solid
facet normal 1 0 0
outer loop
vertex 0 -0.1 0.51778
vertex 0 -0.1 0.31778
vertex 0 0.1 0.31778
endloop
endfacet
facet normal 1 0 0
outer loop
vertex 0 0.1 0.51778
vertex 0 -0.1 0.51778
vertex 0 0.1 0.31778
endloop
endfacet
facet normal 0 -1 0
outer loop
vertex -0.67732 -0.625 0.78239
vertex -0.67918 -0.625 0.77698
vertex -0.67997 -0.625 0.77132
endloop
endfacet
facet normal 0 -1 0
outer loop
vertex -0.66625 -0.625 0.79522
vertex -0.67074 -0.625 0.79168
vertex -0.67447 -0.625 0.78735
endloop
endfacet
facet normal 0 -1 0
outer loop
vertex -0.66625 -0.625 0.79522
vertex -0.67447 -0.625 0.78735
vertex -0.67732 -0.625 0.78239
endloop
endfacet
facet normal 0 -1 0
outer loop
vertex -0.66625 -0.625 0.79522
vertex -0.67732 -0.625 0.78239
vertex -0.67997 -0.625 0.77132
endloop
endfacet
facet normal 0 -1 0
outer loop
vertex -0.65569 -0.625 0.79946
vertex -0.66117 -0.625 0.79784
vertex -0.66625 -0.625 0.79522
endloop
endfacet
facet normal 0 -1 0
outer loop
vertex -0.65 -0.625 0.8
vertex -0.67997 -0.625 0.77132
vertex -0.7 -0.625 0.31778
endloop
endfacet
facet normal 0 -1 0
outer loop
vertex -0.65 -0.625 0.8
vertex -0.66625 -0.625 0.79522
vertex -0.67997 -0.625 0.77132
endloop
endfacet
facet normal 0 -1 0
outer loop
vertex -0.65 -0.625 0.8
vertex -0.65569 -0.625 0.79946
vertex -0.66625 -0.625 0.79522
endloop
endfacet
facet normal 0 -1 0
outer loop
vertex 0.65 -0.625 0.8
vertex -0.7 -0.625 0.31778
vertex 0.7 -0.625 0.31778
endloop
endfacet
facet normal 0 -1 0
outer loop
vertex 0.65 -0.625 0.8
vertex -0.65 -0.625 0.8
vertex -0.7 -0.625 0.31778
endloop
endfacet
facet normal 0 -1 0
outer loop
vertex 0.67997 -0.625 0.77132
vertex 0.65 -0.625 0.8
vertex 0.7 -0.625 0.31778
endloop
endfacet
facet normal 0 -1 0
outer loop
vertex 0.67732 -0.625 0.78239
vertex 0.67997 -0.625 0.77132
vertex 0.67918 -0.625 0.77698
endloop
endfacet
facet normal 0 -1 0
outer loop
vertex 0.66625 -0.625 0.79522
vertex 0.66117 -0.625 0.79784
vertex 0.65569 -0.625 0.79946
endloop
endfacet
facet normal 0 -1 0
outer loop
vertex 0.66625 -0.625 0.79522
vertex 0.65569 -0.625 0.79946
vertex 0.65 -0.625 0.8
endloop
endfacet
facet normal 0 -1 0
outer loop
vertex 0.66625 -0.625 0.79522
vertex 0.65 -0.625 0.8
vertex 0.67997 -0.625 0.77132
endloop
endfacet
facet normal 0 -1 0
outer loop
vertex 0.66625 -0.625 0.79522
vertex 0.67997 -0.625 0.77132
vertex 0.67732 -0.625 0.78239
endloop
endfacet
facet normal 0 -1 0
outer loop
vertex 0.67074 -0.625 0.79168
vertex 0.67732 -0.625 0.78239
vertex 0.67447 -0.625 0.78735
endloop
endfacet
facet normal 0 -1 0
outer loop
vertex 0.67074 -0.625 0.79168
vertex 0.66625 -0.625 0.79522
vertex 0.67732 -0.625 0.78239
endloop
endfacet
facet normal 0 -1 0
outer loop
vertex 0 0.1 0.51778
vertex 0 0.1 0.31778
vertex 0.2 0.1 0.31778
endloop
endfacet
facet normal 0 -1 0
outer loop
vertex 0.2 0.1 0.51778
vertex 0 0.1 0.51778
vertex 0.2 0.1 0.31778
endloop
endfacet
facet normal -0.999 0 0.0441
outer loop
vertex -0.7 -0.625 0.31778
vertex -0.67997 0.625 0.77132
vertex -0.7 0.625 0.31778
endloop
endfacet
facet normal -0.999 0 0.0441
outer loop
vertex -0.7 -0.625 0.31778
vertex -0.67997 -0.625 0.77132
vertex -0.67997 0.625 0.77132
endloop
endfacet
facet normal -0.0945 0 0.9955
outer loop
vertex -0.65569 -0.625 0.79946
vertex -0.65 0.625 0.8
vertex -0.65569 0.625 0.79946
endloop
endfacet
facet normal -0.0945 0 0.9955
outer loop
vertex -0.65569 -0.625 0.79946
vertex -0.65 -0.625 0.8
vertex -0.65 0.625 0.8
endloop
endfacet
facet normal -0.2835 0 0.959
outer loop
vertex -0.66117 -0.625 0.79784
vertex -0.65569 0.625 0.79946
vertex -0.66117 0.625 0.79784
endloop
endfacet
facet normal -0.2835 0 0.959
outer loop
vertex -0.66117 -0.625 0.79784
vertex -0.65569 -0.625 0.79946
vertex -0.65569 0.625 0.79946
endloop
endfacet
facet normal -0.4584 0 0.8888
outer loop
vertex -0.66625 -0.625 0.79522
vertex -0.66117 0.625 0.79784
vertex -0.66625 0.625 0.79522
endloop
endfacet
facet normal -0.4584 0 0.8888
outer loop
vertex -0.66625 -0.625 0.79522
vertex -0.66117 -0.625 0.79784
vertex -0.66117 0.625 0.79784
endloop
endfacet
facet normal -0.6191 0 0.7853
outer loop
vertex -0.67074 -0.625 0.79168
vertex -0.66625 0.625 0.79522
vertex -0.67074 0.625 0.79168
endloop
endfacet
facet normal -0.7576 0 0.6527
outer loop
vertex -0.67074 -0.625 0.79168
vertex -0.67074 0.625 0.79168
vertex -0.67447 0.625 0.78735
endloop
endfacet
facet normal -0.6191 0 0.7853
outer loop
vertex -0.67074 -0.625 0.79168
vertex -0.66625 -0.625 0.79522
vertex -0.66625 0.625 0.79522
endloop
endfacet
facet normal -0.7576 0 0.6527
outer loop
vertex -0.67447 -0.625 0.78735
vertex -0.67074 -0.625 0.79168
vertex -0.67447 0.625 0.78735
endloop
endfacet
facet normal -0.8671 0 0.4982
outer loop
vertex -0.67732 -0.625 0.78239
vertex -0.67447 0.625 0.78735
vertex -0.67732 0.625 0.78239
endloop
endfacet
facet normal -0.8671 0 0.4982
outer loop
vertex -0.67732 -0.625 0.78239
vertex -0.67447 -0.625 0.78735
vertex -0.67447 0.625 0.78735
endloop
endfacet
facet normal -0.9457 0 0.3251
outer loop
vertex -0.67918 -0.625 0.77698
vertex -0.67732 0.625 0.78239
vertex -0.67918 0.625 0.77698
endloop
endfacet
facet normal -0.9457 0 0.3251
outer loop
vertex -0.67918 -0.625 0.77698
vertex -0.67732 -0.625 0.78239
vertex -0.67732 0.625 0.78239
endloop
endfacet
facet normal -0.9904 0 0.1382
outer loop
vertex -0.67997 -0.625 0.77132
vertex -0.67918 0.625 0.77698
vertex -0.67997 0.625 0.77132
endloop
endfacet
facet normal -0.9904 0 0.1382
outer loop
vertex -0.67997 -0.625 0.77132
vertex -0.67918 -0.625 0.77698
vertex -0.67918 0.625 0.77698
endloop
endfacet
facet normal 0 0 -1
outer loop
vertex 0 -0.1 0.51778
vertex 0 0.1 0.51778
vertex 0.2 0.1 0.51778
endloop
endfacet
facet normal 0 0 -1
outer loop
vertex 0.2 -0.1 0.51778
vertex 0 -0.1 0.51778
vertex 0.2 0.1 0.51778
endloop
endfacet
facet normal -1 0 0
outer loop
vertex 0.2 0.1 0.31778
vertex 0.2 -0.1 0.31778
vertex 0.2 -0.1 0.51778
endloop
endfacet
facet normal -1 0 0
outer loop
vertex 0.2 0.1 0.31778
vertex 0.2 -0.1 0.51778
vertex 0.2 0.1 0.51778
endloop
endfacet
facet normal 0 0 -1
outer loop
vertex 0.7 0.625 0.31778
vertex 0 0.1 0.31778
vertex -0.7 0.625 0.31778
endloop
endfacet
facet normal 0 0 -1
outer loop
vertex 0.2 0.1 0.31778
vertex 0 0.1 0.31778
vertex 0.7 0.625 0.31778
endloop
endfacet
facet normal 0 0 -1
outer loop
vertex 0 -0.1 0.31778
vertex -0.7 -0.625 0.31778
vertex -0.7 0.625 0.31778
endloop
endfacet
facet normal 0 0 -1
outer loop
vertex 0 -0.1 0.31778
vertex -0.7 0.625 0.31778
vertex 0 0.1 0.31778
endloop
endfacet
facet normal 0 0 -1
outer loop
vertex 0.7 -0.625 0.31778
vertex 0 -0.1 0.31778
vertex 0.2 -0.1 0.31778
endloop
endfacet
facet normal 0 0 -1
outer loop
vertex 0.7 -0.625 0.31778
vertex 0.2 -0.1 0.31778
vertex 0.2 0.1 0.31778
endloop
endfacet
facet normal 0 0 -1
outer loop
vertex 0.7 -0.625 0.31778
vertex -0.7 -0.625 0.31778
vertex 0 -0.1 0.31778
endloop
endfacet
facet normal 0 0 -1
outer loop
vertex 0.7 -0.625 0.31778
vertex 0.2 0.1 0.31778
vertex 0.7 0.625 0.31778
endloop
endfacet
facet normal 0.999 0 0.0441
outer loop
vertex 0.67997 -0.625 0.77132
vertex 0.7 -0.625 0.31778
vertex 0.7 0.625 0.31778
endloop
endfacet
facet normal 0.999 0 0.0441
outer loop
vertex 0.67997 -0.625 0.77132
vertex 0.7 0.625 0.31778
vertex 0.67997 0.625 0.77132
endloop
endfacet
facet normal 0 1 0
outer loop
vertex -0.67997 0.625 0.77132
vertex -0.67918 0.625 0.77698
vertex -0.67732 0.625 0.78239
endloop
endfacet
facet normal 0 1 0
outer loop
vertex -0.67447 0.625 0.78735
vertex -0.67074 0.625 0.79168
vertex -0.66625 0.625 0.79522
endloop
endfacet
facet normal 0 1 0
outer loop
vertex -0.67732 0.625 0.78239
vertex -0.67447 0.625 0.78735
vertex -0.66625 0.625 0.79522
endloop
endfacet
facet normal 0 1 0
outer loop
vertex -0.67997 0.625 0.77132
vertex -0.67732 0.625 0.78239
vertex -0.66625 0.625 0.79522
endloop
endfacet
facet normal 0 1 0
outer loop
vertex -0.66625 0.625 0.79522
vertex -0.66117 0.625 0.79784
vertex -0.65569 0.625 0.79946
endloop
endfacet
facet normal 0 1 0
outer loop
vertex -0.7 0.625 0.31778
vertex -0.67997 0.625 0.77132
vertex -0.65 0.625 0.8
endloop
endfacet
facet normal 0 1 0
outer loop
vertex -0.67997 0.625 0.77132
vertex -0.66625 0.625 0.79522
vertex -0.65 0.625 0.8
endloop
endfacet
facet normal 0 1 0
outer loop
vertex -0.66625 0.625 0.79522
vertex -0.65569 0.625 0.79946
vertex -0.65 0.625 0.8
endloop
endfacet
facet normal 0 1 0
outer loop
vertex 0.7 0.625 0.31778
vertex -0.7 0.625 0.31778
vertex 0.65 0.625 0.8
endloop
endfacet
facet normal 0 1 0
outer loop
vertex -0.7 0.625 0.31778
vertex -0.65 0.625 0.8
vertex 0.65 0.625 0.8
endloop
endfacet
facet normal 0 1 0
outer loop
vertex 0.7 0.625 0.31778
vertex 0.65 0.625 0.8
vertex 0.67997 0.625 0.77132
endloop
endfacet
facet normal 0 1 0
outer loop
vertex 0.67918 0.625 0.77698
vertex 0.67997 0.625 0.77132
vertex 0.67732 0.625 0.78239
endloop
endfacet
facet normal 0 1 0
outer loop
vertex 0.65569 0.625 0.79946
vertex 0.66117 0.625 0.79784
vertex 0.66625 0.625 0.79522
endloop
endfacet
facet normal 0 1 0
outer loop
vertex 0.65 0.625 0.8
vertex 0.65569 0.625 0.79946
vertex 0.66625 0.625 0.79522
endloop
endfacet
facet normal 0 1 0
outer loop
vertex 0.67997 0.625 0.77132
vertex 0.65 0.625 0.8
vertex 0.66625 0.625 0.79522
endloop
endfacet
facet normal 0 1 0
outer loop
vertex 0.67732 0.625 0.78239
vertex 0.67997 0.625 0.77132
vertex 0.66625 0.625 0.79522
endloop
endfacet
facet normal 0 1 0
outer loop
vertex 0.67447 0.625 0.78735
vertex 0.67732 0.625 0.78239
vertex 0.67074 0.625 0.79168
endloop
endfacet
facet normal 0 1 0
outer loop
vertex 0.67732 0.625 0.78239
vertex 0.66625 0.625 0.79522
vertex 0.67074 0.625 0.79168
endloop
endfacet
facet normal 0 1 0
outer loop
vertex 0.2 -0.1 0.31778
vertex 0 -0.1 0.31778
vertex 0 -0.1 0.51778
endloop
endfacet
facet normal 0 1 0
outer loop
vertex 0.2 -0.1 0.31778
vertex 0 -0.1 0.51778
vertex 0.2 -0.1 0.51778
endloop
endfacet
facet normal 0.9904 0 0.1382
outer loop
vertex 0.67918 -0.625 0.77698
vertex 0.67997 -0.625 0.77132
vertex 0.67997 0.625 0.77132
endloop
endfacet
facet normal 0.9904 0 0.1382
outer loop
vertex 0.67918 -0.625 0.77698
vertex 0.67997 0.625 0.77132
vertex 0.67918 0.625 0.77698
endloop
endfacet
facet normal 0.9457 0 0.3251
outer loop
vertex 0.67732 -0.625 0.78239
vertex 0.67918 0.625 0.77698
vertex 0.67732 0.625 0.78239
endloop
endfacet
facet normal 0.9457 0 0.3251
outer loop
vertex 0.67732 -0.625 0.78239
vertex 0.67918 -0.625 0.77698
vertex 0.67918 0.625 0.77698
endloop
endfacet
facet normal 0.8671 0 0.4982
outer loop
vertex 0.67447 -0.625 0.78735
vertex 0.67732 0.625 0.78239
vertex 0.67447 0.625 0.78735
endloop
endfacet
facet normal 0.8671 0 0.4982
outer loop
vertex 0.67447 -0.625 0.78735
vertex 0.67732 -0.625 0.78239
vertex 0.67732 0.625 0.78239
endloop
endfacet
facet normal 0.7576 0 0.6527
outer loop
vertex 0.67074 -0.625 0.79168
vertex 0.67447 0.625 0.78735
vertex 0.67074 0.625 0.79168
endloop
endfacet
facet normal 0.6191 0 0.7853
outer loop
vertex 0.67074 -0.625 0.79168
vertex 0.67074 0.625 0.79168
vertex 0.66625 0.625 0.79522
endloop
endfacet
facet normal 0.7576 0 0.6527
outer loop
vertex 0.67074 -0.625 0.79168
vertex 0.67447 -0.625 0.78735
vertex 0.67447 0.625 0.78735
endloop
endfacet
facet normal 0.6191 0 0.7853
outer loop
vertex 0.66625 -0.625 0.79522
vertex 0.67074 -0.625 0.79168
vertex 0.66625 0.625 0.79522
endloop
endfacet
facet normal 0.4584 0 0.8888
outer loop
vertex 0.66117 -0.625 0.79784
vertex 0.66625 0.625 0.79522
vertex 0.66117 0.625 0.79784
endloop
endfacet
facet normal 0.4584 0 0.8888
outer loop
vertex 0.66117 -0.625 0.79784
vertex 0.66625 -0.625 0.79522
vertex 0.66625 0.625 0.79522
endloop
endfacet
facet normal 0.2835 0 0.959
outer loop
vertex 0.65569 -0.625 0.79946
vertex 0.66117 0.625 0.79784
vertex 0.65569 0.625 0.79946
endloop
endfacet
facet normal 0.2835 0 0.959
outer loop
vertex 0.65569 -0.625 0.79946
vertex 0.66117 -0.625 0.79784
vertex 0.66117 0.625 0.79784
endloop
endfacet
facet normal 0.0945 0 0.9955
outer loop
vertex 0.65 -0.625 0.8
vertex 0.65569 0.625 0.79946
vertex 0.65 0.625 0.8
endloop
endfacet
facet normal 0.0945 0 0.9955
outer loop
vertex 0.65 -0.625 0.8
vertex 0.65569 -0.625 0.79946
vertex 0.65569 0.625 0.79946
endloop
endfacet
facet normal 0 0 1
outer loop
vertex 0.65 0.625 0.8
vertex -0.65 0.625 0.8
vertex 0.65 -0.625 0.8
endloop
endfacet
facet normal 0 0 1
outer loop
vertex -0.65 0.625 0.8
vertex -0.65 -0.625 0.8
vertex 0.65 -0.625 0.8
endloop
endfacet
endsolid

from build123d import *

# Parameters (mm, degrees)
SKETCH006_W       = 0.2
SKETCH006_H       = 0.2
PAD003_DEPTH      = 0.2
PAD004_DEPTH      = 0.625
PAD004_DEPTH_BACK = 0.625


with BuildPart() as body004:
    # Sketch006 → Pad003 (new body)
    with BuildSketch(Plane.XY):
        with Locations((0.1, 0)):
            Rectangle(SKETCH006_W, SKETCH006_H)
    extrude(amount=PAD003_DEPTH)


with BuildPart() as body004_1:
    # Body002 placement: moved
    add(body004.part.moved(Location((0, 0, 0.31778))))


with BuildPart() as lens:
    # Sketch007 → Pad004 (new body, two sides)
    with BuildSketch(Plane.XZ) as pad004_sk:
        with BuildLine():
            Line((-0.679971, 0.453544), (-0.7, 0))
            Line((-0.7, 0), (0.7, 0))
            Line((0.7, 0), (0.679971, 0.453544))
            ThreePointArc((0.679971, 0.453544), (0.67074, 0.473896), (0.65, 0.48222))
            Line((-0.65, 0.48222), (0.65, 0.48222))
            ThreePointArc((-0.65, 0.48222), (-0.67074, 0.473896), (-0.679971, 0.453544))
        make_face()
    extrude(amount=PAD004_DEPTH)
    extrude(pad004_sk.sketch, amount=-PAD004_DEPTH_BACK)


with BuildPart() as lens_1:
    # Body003 placement: moved
    add(lens.part.moved(Location((0, 0, 0.31778))))

    # Cut: cut Body004
    add(body004_1.part, mode=Mode.SUBTRACT)


solid = lens_1.part
